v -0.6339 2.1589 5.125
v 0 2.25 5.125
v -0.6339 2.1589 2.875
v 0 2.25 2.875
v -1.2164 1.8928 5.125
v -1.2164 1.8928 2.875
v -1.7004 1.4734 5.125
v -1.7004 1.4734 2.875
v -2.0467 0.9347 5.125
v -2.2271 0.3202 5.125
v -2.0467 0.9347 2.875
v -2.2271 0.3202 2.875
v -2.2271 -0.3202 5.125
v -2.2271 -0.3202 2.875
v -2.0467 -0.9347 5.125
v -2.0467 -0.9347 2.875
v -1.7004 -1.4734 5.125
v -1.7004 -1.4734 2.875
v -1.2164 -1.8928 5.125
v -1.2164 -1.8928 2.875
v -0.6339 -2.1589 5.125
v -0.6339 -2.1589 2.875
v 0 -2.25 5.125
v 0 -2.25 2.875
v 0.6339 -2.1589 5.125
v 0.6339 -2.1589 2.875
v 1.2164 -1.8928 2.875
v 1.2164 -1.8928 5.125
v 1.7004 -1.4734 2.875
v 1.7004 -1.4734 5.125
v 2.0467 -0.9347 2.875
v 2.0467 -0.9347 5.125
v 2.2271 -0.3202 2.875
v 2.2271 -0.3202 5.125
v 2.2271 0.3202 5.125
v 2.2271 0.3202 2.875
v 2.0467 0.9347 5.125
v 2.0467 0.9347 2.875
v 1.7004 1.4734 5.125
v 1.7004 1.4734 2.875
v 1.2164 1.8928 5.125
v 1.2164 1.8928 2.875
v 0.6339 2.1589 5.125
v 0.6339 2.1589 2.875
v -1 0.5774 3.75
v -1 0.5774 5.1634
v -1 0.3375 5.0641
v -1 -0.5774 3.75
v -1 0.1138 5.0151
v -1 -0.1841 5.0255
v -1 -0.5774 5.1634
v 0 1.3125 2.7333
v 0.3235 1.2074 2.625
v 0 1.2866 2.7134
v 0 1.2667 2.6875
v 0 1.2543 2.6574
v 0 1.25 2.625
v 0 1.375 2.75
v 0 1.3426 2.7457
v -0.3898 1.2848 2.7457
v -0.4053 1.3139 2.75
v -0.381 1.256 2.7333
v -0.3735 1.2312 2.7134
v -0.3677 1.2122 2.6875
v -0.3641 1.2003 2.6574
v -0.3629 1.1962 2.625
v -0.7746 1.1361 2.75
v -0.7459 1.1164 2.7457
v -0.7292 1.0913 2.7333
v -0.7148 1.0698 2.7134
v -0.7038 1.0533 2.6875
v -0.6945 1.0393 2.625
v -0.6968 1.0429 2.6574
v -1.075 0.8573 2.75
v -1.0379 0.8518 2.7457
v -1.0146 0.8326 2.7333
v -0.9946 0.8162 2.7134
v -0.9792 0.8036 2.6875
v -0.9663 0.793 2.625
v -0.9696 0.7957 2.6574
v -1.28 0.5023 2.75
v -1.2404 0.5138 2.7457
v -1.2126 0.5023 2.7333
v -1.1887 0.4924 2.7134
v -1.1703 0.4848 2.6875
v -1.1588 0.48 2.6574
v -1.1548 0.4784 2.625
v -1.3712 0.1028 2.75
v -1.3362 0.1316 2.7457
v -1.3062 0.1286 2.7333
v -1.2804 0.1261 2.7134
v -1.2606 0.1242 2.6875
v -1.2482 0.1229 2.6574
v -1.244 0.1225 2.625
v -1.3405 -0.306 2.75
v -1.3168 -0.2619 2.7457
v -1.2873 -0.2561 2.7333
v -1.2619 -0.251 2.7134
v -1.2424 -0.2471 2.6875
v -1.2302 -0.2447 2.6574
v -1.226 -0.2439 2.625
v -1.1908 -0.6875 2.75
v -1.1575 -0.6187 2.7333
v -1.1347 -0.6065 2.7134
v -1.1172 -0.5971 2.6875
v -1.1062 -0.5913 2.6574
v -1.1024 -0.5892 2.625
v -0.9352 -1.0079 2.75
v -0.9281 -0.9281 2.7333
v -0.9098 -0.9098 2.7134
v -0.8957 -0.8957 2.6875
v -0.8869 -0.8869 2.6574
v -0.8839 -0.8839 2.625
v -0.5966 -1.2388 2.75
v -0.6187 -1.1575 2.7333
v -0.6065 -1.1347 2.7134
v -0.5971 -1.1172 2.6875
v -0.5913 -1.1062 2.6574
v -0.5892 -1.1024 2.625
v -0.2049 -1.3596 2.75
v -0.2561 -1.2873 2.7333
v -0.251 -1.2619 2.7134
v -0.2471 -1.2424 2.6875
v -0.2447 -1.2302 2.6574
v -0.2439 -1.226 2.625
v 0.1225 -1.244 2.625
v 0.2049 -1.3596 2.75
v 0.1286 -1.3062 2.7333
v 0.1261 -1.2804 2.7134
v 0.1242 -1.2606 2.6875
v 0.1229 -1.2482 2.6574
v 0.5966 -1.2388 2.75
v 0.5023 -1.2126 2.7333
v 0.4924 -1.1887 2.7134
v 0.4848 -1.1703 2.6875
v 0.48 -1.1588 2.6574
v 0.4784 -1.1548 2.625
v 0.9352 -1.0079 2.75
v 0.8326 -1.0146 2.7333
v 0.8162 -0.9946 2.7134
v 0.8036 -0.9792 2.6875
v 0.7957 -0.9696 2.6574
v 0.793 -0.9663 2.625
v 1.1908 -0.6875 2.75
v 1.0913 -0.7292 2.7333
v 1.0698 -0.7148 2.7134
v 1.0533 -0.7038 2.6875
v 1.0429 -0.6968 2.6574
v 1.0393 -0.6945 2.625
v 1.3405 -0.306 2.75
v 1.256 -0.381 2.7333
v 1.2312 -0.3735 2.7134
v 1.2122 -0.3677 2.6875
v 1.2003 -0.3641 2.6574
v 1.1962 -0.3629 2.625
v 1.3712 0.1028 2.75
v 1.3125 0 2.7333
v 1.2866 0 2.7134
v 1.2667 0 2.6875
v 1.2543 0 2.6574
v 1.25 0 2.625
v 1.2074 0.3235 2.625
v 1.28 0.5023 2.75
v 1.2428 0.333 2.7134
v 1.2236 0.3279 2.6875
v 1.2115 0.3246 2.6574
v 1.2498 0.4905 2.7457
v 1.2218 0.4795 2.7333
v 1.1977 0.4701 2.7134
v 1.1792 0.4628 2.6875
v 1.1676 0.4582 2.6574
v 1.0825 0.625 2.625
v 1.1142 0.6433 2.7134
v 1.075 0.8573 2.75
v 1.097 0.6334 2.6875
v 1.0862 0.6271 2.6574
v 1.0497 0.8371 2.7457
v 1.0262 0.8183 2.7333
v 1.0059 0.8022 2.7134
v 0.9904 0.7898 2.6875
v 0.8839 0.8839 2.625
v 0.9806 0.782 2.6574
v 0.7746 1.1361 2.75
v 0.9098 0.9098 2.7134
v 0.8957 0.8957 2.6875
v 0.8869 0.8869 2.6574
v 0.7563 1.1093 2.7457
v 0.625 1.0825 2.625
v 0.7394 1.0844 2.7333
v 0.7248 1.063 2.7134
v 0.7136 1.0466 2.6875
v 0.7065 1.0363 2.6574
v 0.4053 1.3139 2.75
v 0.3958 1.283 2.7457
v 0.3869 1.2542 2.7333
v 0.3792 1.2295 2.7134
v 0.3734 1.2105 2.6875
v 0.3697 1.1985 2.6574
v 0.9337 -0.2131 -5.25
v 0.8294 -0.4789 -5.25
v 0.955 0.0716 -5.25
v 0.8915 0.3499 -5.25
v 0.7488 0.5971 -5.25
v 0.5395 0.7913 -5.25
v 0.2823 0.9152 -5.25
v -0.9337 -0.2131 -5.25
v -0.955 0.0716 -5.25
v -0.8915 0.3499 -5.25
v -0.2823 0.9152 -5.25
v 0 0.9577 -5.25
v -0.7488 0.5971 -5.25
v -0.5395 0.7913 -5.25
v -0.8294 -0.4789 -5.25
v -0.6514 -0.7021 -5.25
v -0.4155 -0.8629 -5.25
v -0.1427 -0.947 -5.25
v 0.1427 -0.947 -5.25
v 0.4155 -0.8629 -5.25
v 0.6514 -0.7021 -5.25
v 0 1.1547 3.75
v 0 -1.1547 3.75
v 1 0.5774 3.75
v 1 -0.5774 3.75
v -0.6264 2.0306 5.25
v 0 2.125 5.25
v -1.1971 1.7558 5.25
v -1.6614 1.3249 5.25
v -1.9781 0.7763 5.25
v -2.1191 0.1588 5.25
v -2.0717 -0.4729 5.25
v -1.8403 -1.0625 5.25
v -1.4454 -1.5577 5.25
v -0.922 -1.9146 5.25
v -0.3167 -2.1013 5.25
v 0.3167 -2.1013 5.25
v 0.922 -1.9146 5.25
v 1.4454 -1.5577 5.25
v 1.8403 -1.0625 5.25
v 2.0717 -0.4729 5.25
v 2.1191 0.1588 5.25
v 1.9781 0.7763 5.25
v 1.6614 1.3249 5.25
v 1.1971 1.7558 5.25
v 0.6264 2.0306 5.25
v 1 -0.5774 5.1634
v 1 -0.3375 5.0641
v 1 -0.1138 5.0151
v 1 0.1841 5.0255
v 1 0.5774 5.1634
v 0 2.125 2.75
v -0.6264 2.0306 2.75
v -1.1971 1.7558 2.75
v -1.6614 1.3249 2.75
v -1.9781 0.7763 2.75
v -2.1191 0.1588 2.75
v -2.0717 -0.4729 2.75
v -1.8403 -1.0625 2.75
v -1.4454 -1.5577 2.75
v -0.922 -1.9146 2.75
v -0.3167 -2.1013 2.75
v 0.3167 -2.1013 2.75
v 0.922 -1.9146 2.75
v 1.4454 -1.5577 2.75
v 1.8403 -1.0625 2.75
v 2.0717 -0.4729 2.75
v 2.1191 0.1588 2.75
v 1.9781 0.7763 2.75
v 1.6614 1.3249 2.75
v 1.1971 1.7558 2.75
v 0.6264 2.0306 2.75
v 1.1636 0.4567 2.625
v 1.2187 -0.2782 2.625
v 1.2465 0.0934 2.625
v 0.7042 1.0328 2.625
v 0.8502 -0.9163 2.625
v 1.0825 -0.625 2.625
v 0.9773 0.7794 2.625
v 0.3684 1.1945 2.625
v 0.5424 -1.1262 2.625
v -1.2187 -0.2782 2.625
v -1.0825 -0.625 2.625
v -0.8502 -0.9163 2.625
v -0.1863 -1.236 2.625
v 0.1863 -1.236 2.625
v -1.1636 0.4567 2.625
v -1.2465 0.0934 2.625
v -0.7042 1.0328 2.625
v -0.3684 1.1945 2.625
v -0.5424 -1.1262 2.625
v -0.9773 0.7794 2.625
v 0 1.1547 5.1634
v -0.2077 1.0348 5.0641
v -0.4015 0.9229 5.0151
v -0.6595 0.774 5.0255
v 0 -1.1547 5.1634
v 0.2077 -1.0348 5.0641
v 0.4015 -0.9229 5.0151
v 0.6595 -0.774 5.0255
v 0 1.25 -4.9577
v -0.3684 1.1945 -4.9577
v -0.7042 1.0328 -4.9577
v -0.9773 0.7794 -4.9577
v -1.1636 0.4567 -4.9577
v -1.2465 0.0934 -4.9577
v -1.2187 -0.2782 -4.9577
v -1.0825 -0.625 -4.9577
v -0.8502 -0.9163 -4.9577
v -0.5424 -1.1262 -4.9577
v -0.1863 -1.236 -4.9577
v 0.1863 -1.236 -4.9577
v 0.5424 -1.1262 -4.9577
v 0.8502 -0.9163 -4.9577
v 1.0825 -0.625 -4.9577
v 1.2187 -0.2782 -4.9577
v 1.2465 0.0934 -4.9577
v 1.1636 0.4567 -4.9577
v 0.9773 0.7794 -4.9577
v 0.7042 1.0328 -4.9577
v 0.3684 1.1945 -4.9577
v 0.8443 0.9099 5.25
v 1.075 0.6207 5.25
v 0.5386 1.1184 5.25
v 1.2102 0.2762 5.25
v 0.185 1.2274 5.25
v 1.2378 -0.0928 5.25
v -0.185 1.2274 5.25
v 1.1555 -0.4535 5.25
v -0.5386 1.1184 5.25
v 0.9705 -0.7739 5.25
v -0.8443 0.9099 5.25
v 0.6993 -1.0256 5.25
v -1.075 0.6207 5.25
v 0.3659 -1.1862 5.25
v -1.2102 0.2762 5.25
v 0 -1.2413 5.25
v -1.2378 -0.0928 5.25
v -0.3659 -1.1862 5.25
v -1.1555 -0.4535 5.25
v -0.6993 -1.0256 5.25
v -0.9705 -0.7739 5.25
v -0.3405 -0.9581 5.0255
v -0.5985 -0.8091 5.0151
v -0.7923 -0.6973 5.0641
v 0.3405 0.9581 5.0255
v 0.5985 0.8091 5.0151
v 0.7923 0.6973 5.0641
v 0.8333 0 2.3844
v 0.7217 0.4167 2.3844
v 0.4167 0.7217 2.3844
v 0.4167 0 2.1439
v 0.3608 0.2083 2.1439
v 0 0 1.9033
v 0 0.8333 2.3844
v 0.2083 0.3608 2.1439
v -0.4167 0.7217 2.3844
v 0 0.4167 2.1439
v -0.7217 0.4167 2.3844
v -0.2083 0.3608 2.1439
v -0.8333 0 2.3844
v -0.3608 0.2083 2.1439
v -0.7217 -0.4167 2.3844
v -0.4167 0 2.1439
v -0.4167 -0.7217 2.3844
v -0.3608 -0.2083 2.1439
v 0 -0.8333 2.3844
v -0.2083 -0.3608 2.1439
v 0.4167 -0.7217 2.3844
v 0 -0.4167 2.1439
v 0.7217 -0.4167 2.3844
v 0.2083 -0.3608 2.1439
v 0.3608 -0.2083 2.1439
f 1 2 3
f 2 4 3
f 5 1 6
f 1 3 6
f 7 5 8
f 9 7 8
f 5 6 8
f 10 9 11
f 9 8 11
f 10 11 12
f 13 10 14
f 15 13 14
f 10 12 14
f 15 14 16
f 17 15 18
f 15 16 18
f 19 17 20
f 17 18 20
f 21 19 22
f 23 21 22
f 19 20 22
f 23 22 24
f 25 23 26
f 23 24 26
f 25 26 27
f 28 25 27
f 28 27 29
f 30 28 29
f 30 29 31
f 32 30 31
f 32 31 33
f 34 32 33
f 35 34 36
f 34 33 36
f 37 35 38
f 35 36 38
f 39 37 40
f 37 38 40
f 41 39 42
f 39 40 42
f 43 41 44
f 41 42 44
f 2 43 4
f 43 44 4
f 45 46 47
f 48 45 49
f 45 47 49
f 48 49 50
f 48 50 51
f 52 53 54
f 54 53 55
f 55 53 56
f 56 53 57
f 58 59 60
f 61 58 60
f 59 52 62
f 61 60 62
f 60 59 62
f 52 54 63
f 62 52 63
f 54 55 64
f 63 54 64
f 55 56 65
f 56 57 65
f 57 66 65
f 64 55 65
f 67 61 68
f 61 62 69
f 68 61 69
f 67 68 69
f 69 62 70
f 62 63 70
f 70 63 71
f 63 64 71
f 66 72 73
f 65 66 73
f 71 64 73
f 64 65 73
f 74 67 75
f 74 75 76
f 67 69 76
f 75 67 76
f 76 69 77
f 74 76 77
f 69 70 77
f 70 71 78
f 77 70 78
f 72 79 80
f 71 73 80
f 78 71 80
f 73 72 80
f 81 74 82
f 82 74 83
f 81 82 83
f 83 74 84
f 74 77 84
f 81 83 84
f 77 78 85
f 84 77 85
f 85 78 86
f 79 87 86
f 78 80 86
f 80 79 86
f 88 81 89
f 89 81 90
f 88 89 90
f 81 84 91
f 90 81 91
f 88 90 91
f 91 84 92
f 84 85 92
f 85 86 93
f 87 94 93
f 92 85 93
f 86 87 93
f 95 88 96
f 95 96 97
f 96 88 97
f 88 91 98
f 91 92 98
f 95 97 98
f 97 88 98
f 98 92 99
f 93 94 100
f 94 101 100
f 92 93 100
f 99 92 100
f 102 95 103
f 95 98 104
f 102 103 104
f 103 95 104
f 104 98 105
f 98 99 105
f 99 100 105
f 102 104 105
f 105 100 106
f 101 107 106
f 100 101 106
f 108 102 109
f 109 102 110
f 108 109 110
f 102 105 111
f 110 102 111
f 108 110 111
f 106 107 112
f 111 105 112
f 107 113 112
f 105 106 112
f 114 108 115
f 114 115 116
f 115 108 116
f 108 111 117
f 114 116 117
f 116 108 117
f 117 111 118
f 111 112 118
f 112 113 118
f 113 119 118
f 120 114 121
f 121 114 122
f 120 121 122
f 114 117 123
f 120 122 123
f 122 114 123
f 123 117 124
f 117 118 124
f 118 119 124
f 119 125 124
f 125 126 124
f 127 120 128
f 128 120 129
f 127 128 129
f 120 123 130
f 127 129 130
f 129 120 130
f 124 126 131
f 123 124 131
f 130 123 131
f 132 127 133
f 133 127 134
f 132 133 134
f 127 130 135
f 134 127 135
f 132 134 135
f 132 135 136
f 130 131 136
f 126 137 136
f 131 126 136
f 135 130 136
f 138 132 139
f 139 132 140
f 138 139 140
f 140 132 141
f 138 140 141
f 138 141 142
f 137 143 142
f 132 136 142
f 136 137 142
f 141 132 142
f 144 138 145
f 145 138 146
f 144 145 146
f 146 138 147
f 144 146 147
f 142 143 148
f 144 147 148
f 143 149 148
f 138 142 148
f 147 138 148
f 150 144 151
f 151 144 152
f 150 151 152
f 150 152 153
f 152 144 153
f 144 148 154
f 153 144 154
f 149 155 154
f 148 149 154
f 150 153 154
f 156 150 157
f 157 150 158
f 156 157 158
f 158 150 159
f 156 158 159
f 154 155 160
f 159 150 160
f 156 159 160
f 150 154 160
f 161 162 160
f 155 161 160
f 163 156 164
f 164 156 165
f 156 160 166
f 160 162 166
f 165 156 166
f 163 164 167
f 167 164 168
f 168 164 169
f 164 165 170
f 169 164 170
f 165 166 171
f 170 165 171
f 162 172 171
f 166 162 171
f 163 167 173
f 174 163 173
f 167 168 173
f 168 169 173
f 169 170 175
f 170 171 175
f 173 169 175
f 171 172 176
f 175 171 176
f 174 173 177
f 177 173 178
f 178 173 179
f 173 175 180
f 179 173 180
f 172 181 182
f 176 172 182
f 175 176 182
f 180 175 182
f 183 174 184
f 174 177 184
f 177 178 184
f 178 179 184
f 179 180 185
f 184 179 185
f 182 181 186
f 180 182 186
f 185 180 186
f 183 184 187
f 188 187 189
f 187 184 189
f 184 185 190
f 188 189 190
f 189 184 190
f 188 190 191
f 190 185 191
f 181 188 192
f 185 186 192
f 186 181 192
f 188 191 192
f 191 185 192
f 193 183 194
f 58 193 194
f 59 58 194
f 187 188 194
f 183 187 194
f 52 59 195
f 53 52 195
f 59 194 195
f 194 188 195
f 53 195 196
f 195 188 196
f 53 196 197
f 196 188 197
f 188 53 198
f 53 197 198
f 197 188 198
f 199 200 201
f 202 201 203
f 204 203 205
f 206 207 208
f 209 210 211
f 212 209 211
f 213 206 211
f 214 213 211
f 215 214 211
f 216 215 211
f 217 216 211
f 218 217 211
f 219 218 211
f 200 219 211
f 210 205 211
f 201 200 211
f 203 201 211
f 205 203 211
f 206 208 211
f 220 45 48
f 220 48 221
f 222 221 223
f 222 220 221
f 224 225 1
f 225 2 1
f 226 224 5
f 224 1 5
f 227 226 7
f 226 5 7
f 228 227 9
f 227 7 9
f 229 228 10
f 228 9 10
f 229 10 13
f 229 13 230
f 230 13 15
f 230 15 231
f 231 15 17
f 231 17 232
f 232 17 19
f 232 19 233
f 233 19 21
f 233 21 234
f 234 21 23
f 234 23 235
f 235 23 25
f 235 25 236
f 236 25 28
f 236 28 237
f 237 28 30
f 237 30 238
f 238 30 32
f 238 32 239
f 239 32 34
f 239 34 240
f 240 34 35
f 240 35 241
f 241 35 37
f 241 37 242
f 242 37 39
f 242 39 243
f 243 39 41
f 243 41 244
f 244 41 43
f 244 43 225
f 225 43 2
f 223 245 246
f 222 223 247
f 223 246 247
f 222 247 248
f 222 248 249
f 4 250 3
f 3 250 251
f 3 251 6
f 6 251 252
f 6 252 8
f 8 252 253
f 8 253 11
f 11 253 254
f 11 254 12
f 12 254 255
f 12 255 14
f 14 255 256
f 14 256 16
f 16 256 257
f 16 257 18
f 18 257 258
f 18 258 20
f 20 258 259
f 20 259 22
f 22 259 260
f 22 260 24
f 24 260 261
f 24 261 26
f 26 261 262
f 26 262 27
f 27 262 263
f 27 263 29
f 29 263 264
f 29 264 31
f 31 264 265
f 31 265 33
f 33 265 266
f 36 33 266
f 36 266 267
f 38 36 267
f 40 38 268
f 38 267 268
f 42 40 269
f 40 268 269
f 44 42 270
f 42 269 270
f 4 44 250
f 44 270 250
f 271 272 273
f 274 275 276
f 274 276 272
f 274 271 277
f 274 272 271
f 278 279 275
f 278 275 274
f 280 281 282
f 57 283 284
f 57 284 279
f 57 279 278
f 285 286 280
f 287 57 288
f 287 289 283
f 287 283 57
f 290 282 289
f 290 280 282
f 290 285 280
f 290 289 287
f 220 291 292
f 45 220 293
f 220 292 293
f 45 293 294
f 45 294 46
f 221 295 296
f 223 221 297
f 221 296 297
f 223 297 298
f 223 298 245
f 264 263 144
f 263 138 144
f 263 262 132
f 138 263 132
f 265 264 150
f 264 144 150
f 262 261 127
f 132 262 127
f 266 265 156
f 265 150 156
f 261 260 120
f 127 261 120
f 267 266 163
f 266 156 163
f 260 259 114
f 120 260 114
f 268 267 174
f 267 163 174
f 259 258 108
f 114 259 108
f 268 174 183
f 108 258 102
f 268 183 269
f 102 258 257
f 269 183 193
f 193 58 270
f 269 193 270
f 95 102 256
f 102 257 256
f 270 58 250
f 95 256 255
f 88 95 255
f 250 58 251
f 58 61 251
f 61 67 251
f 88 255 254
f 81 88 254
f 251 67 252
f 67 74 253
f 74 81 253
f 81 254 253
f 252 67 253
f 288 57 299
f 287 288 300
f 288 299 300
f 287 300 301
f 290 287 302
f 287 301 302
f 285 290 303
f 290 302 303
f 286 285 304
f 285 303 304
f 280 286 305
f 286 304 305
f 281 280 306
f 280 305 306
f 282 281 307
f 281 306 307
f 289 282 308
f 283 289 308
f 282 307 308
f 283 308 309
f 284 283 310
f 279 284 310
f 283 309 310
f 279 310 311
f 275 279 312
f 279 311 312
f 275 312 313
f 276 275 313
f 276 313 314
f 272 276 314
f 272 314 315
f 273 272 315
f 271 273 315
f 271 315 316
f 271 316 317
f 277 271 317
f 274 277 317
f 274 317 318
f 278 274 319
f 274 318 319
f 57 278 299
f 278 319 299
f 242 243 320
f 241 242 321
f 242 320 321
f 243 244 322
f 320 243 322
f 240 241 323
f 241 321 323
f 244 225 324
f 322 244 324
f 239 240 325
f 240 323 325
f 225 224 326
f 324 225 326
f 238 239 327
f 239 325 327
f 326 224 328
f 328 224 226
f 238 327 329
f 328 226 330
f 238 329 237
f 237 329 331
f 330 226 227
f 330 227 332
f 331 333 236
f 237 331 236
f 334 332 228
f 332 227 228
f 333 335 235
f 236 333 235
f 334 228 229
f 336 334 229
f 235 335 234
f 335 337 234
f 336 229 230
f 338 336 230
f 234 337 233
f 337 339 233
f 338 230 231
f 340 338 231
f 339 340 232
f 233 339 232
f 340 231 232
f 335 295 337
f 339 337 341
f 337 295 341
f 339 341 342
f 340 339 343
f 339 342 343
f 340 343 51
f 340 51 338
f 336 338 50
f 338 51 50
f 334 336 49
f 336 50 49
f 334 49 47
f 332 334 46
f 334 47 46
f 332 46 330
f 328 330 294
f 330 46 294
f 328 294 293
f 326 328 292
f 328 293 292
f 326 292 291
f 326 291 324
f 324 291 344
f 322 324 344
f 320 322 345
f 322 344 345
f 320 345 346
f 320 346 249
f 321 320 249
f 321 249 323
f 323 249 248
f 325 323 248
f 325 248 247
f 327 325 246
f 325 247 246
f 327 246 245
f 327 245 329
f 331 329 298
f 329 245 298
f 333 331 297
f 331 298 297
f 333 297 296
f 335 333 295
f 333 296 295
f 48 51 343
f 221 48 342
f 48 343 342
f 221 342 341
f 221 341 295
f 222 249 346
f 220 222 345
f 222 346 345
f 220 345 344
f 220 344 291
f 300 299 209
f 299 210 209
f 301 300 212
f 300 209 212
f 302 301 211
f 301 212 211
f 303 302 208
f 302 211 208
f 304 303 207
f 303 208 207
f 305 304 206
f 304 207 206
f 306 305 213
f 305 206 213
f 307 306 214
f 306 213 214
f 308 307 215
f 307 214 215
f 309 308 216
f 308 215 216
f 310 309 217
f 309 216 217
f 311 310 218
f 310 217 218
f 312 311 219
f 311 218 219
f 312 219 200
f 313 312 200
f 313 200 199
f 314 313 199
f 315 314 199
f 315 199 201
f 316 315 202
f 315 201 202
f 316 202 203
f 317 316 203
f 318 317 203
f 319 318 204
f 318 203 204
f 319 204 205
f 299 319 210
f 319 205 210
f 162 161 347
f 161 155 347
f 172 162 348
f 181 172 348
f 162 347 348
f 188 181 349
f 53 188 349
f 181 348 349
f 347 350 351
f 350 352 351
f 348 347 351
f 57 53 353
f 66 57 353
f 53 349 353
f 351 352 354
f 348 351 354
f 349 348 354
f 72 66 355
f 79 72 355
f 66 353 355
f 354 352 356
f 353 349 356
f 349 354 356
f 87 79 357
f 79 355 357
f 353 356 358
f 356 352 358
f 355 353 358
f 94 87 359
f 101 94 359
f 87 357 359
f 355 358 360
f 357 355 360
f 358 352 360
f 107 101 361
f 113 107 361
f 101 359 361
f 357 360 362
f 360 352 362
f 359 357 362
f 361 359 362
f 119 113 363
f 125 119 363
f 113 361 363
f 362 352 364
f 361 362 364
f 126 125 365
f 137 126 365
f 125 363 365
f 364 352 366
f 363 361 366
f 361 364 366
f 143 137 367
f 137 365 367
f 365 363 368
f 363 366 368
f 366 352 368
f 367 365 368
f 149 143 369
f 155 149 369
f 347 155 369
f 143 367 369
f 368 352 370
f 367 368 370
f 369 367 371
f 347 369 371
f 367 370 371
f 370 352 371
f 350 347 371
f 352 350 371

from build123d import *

# Parameters (mm, degrees)
CUT_EXTRUDE1_DEPTH     = 1.5
SPLIT1_SURFACE_1_BACK  = 13.278
SPLIT1_SURFACE_1_DEPTH = 26.556
SPLIT1_SURFACE_2_BACK  = 13.278
SPLIT1_SURFACE_2_DEPTH = 26.556


with BuildPart() as part:
    # Sketch2 → Revolve1 (revolve)
    with BuildSketch(Plane(origin=(0, 0, 0), x_dir=(0, 0, -1), z_dir=(1, 0, 0))):
        with BuildLine():
            Line((-5.25, 0), (-5.25, 2.125))
            Line((-5.25, 2.125), (-5.125, 2.25))
            Line((-5.125, 2.25), (-2.875, 2.25))
            Line((-2.875, 2.25), (-2.75, 2.125))
            Line((-2.75, 2.125), (-2.75, 1.375))
            ThreePointArc((-2.75, 1.375), (-2.713388348, 1.286611652), (-2.625, 1.25))
            Line((-2.625, 1.25), (4.957716426, 1.25))
            Line((4.957716426, 1.25), (5.25, 0.957716426))
            Line((5.25, 0.957716426), (5.25, 0))
            Line((5.25, 0), (-5.25, 0))
        make_face()
    revolve(axis=Axis((0, 0, -5.25), (0, 0, 1)))

    # Sketch3 → Cut-Extrude1 (cut)
    with BuildSketch(Plane.XY.offset(5.25)):
        Polygon((1, -0.577350269), (1, 0.577350269), (0, 1.154700538), (-1, 0.577350269), (-1, -0.577350269), (0, -1.154700538), align=None)
    extrude(amount=-CUT_EXTRUDE1_DEPTH, mode=Mode.SUBTRACT)

    # Cut-Extrude2 cone 1 section (through the dimple's axis) → Cut-Extrude2 (revolve, cut)
    with BuildSketch(Plane(origin=(0, 0, 5.25), x_dir=(0, -1, 0), z_dir=(1, 0, 0))):
        Polygon((0, 0), (1.241303079, 0), (0, 1.241303079), align=None)
    revolve(axis=Axis((0, 0, 5.25), (0, 0, -1)), mode=Mode.SUBTRACT)


with BuildPart() as body_2:
    # Split1: the piece behind the surface
    add(part.part)
    # Split1 surface: a surface, the sketch's curves swept straight by 26.556 mm
    with BuildLine(Plane(origin=(0, 0, 0), x_dir=(0, 0, -1), z_dir=(1, 0, 0)).offset(-SPLIT1_SURFACE_1_BACK), mode=Mode.PRIVATE) as split1_surface_1_path:
        Line((-2.625, -2.25), (-2.625, 2.25))
    split1_surface_1 = Shell.extrude(split1_surface_1_path.wire(), (1 * SPLIT1_SURFACE_1_DEPTH, 0 * SPLIT1_SURFACE_1_DEPTH, 0 * SPLIT1_SURFACE_1_DEPTH))
    split(bisect_by=split1_surface_1, keep=Keep.BOTTOM)


with BuildPart() as part_1:
    add(part.part)

    # Split1: split by a surface, the side it looks to stays
    # Split1 surface: a surface, the sketch's curves swept straight by 26.556 mm
    with BuildLine(Plane(origin=(0, 0, 0), x_dir=(0, 0, -1), z_dir=(1, 0, 0)).offset(-SPLIT1_SURFACE_2_BACK), mode=Mode.PRIVATE) as split1_surface_2_path:
        Line((-2.625, -2.25), (-2.625, 2.25))
    split1_surface_2 = Shell.extrude(split1_surface_2_path.wire(), (1 * SPLIT1_SURFACE_2_DEPTH, 0 * SPLIT1_SURFACE_2_DEPTH, 0 * SPLIT1_SURFACE_2_DEPTH))
    split(bisect_by=split1_surface_2, keep=Keep.TOP)

    # Sketch8 → Revolve2 (revolve)
    with BuildSketch(Plane(origin=(0, 0, 0), x_dir=(0, 0, -1), z_dir=(1, 0, 0)), mode=Mode.PRIVATE) as revolve2_sk:
        Polygon((-2.75, 0), (-2.75, 1.25), (-2.625, 1.25), (-1.903312164, 0), align=None)
    revolve(revolve2_sk.sketch.rotate(Axis((0, 0, 1.903312164), (0, 0, 1)), 270), axis=Axis((0, 0, 1.903312164), (0, 0, 1)))


solid = Compound([body_2.part, part_1.part])
